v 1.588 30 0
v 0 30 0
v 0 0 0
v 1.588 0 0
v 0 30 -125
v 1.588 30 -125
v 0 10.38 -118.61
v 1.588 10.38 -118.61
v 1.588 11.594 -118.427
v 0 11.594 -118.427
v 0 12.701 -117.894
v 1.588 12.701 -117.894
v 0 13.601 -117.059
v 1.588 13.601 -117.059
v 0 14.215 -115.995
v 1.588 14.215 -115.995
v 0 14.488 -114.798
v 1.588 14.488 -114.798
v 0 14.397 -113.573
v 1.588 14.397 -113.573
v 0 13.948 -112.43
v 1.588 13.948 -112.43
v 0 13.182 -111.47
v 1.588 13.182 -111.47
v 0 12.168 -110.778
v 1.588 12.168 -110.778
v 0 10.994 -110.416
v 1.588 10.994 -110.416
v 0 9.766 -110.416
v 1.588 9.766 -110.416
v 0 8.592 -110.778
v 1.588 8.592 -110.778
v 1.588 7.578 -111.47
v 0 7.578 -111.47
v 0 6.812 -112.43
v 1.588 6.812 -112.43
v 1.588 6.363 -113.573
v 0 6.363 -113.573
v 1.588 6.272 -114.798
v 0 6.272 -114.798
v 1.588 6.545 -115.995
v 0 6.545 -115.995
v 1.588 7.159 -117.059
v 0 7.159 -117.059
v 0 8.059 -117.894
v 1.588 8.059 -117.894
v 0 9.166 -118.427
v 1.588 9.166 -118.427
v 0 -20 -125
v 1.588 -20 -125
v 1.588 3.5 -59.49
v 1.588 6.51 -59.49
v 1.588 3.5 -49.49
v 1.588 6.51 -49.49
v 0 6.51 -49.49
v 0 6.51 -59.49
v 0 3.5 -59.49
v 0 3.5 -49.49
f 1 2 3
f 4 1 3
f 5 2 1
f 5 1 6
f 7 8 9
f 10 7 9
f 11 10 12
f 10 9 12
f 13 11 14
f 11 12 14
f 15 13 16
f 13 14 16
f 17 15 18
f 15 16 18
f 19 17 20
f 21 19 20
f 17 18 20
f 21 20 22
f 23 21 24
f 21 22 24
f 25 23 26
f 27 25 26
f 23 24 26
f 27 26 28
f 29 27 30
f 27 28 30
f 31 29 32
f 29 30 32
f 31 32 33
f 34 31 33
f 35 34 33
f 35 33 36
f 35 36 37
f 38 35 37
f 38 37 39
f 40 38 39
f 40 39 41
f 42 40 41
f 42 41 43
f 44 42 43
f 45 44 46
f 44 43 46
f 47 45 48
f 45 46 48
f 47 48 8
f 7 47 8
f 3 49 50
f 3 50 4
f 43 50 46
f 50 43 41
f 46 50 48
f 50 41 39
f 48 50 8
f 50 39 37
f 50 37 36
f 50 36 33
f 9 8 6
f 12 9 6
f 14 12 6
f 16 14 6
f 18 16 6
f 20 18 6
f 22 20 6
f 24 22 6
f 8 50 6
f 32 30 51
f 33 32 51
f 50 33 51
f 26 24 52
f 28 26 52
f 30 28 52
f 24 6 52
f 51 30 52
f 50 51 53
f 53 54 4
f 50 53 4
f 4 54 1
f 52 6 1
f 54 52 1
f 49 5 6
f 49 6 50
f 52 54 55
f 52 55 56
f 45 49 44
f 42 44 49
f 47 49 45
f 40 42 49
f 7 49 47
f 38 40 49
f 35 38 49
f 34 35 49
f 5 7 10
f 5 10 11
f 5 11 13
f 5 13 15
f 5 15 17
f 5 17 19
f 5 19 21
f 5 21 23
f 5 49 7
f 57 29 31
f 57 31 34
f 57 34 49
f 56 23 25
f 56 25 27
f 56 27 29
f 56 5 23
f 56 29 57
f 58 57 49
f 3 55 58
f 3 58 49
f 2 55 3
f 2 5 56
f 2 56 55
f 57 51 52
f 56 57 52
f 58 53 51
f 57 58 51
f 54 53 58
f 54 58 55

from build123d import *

# Parameters (mm, degrees)
BOSS_EXTRUDE1_DEPTH = 1.5875
SKETCH2_R           = 4.12
SKETCH2_W           = 10
SKETCH2_H           = 3.01
CUT_EXTRUDE1_DEPTH  = 1.5875


with BuildPart() as part:
    # Sketch1 → Boss-Extrude1 (new body)
    with BuildSketch(Plane(origin=(0, 0, 0), x_dir=(0, 0, -1), z_dir=(1, 0, 0))):
        Polygon((0, 17.849301165), (0, 30), (125, 30), (125, -20), (0, 0), (0, 4.461317534), (0, 9.461317534), align=None)
    extrude(amount=BOSS_EXTRUDE1_DEPTH)

    # Sketch2 → Cut-Extrude1 (cut)
    with BuildSketch(Plane(origin=(1.5875, 0, 0), x_dir=(0, 0, -1), z_dir=(1, 0, 0))):
        with Locations((114.49, 10.38)):
            Circle(SKETCH2_R)
        with Locations((54.49, 5.005)):
            Rectangle(SKETCH2_W, SKETCH2_H)
    extrude(amount=-CUT_EXTRUDE1_DEPTH, mode=Mode.SUBTRACT)


solid = part.part
